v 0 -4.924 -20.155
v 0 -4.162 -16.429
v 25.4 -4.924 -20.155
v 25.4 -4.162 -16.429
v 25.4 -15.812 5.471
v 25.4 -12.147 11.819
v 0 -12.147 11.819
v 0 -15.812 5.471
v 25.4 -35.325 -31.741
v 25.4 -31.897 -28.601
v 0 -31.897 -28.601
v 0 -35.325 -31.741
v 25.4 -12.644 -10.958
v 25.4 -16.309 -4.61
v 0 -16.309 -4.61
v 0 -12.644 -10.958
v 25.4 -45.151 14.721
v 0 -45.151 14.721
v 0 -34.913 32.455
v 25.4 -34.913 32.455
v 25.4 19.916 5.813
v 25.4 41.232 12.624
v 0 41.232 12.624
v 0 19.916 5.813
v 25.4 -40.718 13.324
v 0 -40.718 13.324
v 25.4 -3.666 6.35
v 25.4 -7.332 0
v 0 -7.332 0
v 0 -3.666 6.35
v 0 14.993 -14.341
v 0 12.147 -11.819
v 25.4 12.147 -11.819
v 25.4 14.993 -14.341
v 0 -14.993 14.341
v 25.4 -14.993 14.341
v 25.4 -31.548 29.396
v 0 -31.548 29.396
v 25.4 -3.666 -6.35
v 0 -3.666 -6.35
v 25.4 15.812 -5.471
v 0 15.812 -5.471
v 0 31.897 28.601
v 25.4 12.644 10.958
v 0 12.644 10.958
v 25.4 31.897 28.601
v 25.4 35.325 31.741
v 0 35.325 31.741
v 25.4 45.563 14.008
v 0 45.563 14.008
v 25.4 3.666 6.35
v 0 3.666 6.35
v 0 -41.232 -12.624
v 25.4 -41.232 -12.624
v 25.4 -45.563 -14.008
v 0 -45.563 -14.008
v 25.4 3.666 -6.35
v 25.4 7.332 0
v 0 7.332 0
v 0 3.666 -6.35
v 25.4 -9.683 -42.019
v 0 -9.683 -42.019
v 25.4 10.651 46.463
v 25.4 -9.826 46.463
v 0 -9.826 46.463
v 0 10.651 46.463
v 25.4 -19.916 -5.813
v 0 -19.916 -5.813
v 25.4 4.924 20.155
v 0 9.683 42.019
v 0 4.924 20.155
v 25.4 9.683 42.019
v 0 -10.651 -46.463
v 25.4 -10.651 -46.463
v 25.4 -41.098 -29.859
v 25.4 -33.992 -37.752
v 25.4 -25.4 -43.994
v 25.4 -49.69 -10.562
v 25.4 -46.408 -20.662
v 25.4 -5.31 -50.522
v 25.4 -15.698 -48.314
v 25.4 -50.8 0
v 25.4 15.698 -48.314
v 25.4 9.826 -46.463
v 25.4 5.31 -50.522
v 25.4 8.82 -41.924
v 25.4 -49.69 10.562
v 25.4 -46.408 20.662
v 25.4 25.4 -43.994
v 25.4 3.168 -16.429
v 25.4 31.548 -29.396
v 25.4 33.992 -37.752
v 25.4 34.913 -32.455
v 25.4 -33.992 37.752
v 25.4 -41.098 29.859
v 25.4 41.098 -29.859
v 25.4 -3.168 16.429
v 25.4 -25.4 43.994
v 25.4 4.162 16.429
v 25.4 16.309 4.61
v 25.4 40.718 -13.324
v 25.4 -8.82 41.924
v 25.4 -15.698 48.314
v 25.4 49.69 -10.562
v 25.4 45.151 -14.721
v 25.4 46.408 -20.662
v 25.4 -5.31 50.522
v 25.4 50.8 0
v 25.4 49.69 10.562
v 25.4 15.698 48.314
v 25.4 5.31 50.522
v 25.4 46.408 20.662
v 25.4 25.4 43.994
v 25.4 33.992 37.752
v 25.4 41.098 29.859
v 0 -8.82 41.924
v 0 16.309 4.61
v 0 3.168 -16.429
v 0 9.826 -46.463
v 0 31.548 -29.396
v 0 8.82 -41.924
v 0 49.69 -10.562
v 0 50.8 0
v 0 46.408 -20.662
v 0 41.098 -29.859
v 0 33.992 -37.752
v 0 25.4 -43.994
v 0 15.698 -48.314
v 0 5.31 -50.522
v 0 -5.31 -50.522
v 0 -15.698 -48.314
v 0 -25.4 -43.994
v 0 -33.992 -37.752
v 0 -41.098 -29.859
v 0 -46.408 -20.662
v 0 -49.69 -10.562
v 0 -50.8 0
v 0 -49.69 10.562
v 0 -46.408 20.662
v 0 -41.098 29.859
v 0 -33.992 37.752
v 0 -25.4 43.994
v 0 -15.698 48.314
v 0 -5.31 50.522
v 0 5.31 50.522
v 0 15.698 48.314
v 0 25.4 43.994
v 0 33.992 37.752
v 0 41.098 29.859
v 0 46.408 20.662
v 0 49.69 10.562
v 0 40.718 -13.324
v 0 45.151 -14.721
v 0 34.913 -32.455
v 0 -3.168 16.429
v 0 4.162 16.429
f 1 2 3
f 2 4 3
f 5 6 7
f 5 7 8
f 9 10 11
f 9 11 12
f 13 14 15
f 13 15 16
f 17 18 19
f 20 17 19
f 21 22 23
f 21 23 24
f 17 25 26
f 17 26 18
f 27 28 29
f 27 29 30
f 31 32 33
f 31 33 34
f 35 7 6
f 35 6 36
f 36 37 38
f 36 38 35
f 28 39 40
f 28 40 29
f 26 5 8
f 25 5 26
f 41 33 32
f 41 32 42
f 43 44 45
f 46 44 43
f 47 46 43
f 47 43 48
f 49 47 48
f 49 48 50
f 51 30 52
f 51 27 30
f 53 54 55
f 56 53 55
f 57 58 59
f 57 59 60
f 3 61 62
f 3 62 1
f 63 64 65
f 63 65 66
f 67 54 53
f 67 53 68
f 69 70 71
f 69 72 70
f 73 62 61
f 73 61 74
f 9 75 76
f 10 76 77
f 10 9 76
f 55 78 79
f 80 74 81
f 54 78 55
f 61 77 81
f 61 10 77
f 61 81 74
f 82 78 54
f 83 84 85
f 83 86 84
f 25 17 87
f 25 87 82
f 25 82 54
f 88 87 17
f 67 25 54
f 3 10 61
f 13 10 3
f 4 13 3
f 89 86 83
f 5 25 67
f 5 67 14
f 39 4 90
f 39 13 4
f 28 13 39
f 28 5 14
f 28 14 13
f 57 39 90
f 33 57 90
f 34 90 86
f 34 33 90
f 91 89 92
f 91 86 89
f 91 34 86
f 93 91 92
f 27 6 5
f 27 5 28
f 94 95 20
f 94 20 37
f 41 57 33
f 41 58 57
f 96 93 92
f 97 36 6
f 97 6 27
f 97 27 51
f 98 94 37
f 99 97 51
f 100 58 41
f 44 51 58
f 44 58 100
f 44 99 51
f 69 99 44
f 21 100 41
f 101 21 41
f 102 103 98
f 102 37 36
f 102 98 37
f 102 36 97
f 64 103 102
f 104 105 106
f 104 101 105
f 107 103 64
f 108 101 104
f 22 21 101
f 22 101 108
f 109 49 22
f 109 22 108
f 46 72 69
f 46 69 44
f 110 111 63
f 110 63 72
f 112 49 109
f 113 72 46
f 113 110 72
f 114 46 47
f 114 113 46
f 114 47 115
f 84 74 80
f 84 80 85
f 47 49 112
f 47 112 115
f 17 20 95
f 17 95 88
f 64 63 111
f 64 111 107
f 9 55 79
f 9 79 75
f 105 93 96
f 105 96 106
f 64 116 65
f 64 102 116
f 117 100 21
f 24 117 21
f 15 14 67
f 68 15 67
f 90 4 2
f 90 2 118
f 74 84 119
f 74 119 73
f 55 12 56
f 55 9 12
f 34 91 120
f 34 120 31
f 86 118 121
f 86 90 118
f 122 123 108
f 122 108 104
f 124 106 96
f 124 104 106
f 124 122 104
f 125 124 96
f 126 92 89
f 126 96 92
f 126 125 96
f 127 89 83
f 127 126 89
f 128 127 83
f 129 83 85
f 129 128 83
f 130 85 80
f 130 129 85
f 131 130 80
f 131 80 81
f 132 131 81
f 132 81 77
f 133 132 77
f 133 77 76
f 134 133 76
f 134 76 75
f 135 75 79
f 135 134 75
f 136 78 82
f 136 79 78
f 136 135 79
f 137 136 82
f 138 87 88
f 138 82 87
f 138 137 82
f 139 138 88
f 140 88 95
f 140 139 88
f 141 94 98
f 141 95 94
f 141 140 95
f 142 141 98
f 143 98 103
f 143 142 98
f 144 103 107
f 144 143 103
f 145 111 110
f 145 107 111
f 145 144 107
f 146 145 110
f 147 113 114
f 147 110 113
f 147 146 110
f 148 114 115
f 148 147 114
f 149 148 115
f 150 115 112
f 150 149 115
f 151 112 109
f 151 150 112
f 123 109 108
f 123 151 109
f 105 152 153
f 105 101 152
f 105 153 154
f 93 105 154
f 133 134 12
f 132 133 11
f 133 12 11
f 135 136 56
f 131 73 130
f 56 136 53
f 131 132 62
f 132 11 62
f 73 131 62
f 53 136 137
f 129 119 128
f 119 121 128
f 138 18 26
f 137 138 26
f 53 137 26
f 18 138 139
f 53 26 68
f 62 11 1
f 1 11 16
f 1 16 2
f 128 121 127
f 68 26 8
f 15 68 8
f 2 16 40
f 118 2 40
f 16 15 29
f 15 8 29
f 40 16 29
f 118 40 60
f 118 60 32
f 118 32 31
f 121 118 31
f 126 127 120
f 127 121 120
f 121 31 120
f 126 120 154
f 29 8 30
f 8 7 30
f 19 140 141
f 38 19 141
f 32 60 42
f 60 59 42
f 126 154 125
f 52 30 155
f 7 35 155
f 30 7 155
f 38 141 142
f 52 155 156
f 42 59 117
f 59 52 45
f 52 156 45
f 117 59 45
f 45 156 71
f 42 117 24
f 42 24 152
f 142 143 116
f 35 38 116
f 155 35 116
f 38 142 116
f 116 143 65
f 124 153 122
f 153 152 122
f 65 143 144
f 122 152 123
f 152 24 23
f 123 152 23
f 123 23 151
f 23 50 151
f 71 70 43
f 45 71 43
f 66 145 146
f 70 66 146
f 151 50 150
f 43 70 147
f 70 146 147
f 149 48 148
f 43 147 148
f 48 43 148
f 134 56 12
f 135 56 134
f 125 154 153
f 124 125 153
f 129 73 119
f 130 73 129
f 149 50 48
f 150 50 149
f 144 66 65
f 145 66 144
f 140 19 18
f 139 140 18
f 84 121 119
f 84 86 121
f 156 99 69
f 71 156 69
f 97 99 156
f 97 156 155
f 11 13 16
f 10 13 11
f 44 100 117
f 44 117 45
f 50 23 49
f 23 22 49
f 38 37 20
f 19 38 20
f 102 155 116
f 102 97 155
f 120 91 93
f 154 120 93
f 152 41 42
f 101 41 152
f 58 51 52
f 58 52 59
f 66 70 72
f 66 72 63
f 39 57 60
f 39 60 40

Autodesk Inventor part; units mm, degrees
ref_plane "YZ Plane" through (0, 0, 0) normal (1, 0, 0) x (0, 1, 0)
ref_plane "XZ Plane" through (0, 0, 0) normal (0, 1, 0) x (-1, 0, 0)
ref_plane "XY Plane" through (0, 0, 0) normal (0, 0, 1) x (1, 0, 0)
sketch "Sketch1" plane through (0, 0, 0) normal (1, 0, 0) x (0, 1, 0)
  circle A0 centre (0, 0) radius 50.8
  dimension "d16" = 101.6
extrude "Extrusion1" add sketch "Sketch1" along normal blind 25.4
sketch "Sketch2" plane through (25.4, 0, 0) normal (1, 0, 0) x (0, 0, -1)
  circle A0 centre (0, 0) radius 50.8
  circle A1 centre (0, 0) radius 25.4
  line L0 (6.35, 3.6662) -> (6.35, -3.6662)
  line L1 (6.35, -3.6662) -> (0, -7.3323)
  line L2 (0, -7.3323) -> (-6.35, -3.6662)
  line L3 (-6.35, -3.6662) -> (-6.35, 3.6662)
  line L4 (-6.35, 3.6662) -> (0, 7.3323)
  line L5 (0, 7.3323) -> (6.35, 3.6662)
  circle A2 centre (0, 0) radius 44.45
  line L6 (0, 0) -> (-11.3174, 49.5233)
  circle A3 centre (0, 0) radius 50.8 projected
  line L7 (0, 0) -> (10.4532, 49.7129)
  arc A4 (9.1466, 43.4988) -> (-9.9027, 43.3329) centre (0, 0) ccw
  point P0 (5.2266, 24.8564)
  point P1 (-5.6587, 24.7616)
  dimension "d3" = 25.4
  dimension "d4" = 6.35
  dimension "d5" = 0
  dimension "d8" = 6.35
  dimension "d9" = 19.05
  dimension "d10" = 0
extrude "Extrusion4" cut sketch "Sketch2" against normal through all contours L7 L6 L4 L5 | L5 L0 L1 L2 L3 L4 L6 L7
sketch "Sketch3" plane through (25.4, 0, 0) normal (1, 0, 0) x (0, 0, -1)
  circle A0 centre (0, 0) radius 50.8 projected
  line L0 (-46.4628, -9.6079) -> (-46.4628, 9.6097)
  line L1 (-16.4289, -3.168) -> (-41.9244, -8.8202)
  line L2 (-42.0194, 9.6834) -> (-20.1547, 4.9235)
  line L3 (-16.4289, 4.1621) -> (-16.4289, -3.168)
  line L4 (-16.4289, 4.1621) -> (-20.1547, 4.9235)
  line L5 (-42.0194, 9.6834) -> (-46.4628, 10.6507)
  line L6 (-46.4628, 10.6507) -> (-46.4628, 9.6097)
  line L7 (-41.9244, -8.8202) -> (-46.4628, -9.8264)
  line L8 (-46.4628, -9.8264) -> (-46.4628, -9.6079)
extrude "Extrusion5" cut sketch "Sketch3" against normal through all contours L0 L6 L5 L2 L4 L3 L1 L7 L8
pattern_circular "Circular Pattern2" count 6 over 360 about axis through (0, 0, 0) along (1, 0, 0) of "Extrusion5"
properties part number "part_4 in. Compliance Wheel" material "ABS Plastic"
